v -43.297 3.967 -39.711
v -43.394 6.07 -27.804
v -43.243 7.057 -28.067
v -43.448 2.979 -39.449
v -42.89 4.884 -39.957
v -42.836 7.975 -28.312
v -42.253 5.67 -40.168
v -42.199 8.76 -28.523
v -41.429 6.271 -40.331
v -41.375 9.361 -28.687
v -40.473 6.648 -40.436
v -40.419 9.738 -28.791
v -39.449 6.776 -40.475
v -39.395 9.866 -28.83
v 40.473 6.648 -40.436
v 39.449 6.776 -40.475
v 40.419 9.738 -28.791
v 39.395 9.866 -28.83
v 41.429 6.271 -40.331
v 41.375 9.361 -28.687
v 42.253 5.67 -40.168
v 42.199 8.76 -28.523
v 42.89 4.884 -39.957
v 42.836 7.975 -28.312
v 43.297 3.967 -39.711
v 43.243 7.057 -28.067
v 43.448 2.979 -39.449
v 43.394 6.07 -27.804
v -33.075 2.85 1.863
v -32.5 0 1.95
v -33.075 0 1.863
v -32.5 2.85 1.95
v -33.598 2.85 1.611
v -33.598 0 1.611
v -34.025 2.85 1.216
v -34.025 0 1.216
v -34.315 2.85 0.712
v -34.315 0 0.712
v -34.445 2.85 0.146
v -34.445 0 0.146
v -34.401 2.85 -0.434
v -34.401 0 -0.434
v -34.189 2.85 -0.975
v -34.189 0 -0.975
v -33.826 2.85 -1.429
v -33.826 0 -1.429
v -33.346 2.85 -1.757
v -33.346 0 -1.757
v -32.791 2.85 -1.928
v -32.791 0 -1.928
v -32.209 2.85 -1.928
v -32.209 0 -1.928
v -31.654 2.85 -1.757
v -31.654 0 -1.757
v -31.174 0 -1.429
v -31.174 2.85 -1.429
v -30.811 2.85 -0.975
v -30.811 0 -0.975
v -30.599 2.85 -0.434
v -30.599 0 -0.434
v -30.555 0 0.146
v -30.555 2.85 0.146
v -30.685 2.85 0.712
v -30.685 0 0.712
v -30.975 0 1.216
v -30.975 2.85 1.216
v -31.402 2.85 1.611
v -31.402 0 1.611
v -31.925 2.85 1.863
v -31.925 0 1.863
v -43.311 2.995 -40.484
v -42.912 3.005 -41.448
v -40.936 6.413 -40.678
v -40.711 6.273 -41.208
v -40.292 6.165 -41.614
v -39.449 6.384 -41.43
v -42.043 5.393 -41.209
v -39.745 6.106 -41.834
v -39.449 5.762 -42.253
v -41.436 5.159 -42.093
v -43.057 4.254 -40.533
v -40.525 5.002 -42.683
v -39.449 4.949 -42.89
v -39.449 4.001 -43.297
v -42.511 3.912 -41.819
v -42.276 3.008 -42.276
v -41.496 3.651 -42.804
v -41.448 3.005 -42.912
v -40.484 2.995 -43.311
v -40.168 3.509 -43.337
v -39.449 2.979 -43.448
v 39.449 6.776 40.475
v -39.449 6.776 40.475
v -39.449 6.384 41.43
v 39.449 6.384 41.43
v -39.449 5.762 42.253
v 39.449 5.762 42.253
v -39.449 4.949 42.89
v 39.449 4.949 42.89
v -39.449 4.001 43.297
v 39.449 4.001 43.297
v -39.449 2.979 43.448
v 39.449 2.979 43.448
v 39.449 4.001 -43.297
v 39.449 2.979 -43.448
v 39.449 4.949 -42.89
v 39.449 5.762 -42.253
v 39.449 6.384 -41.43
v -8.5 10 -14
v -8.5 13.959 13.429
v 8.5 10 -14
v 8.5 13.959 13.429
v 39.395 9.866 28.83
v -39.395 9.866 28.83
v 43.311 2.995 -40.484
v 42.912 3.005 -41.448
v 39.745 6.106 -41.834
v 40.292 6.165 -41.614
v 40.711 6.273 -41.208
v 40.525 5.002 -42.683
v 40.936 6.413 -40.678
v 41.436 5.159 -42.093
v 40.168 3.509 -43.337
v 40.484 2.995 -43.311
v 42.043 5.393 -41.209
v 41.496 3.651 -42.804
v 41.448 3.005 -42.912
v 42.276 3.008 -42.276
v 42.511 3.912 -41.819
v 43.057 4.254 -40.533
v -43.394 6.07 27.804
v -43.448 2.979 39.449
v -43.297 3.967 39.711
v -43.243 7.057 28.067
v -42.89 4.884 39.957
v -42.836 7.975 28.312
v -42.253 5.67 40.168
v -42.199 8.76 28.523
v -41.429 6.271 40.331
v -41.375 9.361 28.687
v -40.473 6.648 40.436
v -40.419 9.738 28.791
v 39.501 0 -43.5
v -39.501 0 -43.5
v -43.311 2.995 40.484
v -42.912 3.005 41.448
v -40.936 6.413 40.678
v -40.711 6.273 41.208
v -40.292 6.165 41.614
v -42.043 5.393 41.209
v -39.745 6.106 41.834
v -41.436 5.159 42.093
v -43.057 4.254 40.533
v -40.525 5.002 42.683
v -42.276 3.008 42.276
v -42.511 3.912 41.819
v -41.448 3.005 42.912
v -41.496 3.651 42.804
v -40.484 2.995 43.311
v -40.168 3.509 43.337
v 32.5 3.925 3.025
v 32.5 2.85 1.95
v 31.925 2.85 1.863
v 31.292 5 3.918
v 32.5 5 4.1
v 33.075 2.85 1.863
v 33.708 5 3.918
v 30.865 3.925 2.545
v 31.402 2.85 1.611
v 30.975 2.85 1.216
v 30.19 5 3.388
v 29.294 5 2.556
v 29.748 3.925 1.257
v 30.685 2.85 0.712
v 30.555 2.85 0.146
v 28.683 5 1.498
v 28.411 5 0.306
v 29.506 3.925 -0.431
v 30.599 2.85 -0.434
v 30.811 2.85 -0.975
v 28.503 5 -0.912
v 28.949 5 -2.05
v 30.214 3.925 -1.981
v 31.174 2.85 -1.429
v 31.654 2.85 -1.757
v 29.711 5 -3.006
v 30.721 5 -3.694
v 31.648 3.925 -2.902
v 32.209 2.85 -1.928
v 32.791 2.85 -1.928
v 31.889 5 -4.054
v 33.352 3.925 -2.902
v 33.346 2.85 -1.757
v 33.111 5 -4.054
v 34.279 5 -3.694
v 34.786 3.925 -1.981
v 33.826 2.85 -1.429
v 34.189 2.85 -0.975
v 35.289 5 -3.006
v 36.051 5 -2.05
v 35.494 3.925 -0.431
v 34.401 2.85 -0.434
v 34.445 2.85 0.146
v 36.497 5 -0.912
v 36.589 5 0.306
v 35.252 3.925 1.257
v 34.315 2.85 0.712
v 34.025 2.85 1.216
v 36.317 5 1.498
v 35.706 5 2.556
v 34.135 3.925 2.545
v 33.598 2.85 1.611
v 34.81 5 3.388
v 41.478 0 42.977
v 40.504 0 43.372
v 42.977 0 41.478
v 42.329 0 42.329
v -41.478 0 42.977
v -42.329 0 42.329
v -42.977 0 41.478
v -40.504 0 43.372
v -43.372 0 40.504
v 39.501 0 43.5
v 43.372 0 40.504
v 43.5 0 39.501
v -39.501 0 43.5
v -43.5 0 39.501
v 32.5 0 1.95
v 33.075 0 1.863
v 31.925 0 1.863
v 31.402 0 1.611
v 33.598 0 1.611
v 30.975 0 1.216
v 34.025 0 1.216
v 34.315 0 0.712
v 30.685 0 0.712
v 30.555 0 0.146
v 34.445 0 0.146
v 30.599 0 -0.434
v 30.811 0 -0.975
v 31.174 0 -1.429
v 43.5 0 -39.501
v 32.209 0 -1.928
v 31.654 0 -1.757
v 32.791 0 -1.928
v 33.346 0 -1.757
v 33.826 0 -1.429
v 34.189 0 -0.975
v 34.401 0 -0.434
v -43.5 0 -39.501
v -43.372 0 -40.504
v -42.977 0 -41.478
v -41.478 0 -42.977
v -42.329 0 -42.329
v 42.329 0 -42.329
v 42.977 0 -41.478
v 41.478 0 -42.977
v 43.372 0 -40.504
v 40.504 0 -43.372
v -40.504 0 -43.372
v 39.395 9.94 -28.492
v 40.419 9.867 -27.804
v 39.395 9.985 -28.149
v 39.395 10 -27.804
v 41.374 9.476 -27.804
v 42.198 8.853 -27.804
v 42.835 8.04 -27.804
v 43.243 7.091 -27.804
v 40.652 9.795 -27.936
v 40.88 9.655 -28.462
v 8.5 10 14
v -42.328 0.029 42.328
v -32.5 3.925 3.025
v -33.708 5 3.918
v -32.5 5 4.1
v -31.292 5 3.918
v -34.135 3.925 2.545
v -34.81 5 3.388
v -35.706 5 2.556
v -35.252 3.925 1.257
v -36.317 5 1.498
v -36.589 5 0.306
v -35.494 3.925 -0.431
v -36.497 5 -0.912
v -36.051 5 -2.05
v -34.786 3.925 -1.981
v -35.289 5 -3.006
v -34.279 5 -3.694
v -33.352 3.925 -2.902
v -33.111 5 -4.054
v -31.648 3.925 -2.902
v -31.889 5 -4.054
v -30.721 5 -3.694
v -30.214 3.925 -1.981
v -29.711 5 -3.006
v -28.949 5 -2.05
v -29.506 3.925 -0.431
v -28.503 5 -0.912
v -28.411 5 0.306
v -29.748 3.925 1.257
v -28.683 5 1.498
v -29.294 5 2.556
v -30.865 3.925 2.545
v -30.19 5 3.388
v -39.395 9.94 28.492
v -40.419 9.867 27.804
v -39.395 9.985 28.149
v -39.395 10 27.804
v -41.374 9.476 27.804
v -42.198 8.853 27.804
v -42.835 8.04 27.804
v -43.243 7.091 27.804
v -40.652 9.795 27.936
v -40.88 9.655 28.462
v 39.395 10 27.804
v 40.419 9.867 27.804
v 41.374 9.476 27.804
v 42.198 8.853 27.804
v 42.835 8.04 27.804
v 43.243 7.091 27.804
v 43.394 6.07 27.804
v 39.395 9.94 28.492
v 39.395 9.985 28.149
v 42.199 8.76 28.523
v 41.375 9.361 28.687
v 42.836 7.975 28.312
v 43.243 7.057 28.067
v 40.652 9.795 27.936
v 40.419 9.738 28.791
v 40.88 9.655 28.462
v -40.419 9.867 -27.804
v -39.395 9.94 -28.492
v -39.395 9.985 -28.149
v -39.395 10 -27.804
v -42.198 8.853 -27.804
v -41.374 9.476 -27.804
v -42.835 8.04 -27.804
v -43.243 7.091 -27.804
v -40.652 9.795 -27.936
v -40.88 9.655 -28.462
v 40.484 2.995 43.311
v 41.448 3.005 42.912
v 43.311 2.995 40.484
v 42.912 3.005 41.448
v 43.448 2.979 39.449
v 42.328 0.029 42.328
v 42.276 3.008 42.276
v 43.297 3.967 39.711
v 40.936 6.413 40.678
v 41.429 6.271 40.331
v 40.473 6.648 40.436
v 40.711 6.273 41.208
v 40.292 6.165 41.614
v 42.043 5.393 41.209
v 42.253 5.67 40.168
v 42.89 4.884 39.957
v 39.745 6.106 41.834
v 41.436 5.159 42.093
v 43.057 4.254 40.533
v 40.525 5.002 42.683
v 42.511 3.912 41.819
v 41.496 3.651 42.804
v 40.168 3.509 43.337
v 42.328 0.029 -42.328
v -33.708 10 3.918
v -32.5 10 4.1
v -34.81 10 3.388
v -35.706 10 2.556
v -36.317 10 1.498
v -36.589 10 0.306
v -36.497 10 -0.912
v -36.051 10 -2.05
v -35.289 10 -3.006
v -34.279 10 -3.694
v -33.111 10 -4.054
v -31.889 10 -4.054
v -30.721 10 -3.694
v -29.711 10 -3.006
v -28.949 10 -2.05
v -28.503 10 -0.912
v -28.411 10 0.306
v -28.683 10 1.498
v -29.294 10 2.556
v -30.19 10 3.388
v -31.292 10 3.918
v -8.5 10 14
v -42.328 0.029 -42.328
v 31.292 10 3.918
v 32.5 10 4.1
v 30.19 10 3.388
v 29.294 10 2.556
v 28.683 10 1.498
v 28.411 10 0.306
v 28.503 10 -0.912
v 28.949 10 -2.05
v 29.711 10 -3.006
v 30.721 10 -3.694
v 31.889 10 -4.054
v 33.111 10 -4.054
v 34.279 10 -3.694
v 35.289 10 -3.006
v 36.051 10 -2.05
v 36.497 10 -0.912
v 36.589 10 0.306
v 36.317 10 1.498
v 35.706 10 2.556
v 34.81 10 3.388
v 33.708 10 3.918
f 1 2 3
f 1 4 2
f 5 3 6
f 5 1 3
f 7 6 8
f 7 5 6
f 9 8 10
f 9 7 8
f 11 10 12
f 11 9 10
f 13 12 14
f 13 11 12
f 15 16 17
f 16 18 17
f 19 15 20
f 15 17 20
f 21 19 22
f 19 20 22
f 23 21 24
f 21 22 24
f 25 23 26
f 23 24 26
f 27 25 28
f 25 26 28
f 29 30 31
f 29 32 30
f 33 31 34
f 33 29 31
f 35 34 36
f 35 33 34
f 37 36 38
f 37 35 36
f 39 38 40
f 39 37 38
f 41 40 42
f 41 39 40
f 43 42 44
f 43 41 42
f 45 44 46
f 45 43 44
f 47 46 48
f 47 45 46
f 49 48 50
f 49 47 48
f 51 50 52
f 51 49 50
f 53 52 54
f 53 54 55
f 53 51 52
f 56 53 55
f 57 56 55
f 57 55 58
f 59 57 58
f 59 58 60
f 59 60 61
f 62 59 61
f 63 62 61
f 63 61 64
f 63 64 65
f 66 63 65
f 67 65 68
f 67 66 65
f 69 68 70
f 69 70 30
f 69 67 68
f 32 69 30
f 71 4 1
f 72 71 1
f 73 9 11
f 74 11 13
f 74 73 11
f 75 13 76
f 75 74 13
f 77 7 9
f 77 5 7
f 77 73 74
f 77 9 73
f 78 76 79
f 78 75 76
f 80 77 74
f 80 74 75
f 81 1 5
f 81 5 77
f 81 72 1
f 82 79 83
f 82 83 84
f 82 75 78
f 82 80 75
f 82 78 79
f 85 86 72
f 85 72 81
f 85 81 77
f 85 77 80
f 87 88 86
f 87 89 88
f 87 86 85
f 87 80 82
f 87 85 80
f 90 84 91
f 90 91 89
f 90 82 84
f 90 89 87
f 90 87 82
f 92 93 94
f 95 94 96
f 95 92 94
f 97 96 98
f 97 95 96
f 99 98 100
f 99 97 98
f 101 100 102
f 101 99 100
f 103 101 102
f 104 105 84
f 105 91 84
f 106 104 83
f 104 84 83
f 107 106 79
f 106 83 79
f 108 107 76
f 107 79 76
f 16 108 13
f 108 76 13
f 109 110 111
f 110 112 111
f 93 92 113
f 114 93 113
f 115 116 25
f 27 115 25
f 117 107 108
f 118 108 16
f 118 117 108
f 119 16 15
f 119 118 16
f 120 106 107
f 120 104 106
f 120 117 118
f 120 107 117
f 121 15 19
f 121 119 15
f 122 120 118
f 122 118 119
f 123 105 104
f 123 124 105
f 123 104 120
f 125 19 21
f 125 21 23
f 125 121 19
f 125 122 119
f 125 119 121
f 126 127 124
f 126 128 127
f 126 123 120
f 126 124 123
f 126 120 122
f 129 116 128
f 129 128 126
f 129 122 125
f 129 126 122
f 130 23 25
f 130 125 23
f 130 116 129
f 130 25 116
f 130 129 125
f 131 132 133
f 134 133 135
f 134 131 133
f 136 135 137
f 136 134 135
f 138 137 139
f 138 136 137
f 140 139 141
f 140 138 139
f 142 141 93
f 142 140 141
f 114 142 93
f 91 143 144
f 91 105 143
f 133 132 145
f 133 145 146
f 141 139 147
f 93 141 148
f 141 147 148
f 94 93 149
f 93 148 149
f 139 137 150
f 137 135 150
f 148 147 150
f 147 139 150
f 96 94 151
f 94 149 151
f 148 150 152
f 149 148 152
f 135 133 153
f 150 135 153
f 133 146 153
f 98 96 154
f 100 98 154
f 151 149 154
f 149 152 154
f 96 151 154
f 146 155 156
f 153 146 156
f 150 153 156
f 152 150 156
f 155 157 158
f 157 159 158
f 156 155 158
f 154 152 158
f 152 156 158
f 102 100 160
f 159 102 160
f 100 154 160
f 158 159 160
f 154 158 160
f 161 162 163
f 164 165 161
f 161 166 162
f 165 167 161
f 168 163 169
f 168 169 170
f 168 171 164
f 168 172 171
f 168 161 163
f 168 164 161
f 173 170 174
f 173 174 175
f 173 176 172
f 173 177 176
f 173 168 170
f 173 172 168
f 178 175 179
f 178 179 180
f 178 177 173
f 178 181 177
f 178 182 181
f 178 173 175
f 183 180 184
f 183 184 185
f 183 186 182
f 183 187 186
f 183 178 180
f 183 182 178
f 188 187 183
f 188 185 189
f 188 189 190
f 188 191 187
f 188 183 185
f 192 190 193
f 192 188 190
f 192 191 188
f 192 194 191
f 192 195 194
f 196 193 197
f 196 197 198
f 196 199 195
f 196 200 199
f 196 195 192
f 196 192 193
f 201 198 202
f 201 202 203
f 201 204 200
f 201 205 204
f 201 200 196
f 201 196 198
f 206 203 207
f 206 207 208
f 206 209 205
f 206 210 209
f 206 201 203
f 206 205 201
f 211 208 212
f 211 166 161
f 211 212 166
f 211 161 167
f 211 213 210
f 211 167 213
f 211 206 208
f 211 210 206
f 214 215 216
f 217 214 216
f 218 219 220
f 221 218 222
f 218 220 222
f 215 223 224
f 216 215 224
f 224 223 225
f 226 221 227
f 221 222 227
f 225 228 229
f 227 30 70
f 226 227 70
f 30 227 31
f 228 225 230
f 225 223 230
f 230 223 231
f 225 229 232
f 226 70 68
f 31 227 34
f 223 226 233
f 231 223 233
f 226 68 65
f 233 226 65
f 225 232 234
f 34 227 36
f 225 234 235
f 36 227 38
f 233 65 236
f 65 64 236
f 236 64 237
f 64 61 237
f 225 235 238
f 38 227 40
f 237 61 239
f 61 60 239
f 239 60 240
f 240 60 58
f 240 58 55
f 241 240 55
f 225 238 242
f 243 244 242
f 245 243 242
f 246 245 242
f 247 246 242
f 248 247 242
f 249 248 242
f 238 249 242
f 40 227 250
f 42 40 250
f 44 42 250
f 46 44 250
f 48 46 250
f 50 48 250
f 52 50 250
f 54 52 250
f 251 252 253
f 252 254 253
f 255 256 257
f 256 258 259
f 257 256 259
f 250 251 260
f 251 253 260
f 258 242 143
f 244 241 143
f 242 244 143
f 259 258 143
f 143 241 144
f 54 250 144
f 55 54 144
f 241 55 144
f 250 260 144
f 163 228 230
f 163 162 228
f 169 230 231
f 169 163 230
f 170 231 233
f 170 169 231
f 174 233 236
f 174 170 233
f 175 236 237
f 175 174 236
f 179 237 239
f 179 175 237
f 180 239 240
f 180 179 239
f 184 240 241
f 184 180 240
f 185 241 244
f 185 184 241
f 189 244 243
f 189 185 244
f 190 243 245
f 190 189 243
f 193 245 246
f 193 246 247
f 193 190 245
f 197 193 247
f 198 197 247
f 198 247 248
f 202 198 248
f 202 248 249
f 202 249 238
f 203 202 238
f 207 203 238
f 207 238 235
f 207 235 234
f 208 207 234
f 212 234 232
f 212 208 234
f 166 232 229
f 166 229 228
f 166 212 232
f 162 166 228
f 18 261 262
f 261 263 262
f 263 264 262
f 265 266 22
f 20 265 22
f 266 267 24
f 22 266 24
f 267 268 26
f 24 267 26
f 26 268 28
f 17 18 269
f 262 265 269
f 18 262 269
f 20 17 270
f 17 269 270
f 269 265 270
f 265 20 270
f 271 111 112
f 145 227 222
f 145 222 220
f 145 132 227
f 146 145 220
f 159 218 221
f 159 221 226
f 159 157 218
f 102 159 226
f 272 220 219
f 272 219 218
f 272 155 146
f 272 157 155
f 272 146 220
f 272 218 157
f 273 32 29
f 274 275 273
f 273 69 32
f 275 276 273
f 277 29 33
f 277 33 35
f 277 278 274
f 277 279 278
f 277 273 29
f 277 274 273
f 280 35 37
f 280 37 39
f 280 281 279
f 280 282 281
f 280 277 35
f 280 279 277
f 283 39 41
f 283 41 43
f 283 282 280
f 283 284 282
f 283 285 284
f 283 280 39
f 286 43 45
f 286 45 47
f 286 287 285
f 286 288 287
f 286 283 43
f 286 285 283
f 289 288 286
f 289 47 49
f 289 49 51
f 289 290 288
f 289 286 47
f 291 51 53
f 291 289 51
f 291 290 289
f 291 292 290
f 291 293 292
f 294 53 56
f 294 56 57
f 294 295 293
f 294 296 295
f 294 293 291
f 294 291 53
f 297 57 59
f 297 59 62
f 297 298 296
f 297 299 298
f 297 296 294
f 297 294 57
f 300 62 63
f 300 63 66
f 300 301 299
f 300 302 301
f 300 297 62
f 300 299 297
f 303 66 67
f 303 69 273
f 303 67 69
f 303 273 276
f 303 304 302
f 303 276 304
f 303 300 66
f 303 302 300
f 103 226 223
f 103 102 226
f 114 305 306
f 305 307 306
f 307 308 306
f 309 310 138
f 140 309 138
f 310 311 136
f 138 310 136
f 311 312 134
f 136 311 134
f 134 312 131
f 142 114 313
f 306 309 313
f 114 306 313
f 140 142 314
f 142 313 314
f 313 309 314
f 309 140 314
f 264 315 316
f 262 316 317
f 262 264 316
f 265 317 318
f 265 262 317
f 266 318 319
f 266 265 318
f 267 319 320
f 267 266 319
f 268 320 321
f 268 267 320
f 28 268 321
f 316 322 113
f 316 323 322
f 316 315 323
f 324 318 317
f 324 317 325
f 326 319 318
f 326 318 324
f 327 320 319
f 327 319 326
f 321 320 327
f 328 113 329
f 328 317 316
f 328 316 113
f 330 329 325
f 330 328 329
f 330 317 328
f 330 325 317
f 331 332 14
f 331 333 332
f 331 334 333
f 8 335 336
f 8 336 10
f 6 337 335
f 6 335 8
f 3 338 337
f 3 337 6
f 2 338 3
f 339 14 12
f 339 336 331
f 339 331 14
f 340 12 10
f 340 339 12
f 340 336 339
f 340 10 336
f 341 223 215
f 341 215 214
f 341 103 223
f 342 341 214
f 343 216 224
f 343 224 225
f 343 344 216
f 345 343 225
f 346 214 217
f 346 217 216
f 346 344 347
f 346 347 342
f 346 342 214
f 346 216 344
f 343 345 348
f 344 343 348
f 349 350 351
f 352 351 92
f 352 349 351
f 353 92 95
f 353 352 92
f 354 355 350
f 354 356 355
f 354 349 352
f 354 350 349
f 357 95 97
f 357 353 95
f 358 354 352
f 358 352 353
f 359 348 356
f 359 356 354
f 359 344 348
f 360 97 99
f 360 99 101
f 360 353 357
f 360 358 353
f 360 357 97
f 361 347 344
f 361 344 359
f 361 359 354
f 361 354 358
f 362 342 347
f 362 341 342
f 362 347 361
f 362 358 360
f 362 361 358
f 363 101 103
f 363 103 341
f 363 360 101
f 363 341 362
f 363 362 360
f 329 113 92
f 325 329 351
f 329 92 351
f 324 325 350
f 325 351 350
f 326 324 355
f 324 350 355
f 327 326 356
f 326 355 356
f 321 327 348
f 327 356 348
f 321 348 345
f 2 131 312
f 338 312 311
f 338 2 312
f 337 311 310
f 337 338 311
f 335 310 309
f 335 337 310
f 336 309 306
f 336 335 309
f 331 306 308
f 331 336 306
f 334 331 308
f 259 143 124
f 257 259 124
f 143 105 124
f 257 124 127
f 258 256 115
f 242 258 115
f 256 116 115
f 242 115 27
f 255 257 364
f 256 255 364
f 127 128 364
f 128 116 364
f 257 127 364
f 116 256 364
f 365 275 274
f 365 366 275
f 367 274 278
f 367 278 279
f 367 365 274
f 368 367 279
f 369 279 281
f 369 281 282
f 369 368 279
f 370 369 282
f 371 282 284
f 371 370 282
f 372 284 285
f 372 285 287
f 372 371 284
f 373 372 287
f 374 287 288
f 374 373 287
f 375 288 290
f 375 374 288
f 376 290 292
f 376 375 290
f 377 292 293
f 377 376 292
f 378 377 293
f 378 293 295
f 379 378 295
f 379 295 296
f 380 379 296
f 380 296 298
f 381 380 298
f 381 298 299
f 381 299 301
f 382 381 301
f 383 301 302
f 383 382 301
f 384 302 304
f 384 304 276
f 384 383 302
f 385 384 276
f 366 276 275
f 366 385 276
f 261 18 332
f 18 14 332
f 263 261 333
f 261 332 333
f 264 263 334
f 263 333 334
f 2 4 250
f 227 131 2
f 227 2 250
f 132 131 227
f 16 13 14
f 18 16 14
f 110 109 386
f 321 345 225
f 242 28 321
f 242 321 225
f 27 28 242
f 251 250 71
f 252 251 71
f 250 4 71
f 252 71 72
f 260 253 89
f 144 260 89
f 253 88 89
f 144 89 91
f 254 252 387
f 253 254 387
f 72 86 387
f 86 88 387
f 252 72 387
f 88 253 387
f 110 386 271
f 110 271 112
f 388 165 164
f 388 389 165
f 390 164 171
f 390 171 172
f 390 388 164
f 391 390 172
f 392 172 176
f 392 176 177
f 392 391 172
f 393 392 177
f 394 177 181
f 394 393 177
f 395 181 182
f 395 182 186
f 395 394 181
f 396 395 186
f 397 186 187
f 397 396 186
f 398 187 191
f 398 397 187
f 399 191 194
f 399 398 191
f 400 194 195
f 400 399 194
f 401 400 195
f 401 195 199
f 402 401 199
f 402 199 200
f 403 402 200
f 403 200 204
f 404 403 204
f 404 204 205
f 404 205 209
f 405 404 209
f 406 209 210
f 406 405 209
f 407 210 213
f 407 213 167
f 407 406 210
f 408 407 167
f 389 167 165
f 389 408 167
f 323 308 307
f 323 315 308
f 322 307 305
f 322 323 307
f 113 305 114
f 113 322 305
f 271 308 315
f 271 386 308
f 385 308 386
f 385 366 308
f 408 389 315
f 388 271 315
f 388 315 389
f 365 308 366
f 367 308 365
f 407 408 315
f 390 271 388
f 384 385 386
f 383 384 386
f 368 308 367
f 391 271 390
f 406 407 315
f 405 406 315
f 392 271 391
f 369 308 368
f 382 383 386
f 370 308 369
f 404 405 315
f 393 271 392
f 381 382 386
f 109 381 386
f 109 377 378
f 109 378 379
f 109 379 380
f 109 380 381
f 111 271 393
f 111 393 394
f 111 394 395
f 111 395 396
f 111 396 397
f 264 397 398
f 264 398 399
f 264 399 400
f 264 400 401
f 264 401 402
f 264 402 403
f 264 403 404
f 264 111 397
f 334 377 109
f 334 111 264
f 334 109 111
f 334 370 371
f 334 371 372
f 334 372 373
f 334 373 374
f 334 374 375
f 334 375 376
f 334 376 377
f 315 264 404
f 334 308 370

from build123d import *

# Parameters (mm, degrees)
SKETCH1_W                                      = 87
SKETCH1_H                                      = 87
BOSS_EXTRUDE1_DEPTH                            = 10
BOSS_EXTRUDE1_TAPER                            = 1
CHAMFER1_SIZE                                  = 4
CHAMFER1_SIZE_2                                = 15
BOSS_EXTRUDE2_DEPTH                            = 8.5
FILLET1_R                                      = 4
CSK_FOR_M3_5_FLAT_HEAD_MACHINE_SCREW1_AT_COUNT = 2
CSK_FOR_M3_5_FLAT_HEAD_MACHINE_SCREW1_AT_PITCH = 65


with BuildPart() as part:
    # Sketch1 → Boss-Extrude1 (new body)
    with BuildSketch(Plane(origin=(0, 0, 0), x_dir=(1, 0, 0), z_dir=(0, 1, 0))):
        Rectangle(SKETCH1_W, SKETCH1_H)
    extrude(amount=BOSS_EXTRUDE1_DEPTH, taper=BOSS_EXTRUDE1_TAPER)

    # Chamfer1
    # the kernel refuses this chamfer: 15, 4 mm, written as the material it takes off along each edge
    with BuildSketch(Plane(origin=(-82.277161627, 10, 43.325449351), x_dir=(0, -0.9879836574445086, 0.1545583793347103), z_dir=(1, 0, 0)), Plane(origin=(82.277161627, 10, -43.325449351), x_dir=(0, -0.9879836574445086, -0.1545583793347103), z_dir=(-1, 0, 0))) as chamfer1_piece_1:
        Polygon((CHAMFER1_SIZE * 0.990530598403, CHAMFER1_SIZE * 0.137292147002), (-CHAMFER1_SIZE_2 * 0.154558379335, CHAMFER1_SIZE_2 * 0.987983657445), (0, 0), align=None)
    extrude(amount=164.554323254, mode=Mode.SUBTRACT)

    # Sketch2 → Boss-Extrude2 (add, symmetric)
    with BuildSketch(Plane(origin=(0, 0, 0), x_dir=(0, 0, -1), z_dir=(1, 0, 0))):
        Polygon((-14, 10), (-13.428571429, 13.958973274), (14, 10), align=None)
    extrude(amount=BOSS_EXTRUDE2_DEPTH, both=True)

    # Fillet1
    fillet1_edges = [part.edges().sort_by_distance(p)[0] for p in [
        (43.325449351, 10, 0),
        (-43.325449351, 10, 0),
        (0, 10, 28.325449351),
        (0, 10, -28.325449351),
        (-43.447629488, 3.00030461, 43.447629488),
        (-43.447629488, 3.00030461, -43.447629488),
        (-43.360354164, 8.00030461, 35.860354164),
        (-43.360354164, 8.00030461, -35.860354164),
        (43.447629488, 3.00030461, -43.447629488),
        (0, 6.000609219, -43.395258976),
        (43.447629488, 3.00030461, 43.447629488),
        (43.360354164, 8.00030461, 35.860354164),
        (43.360354164, 8.00030461, -35.860354164),
        (0, 6.000609219, 43.395258976),
    ]]
    fillet(fillet1_edges, radius=FILLET1_R)

    # Sketch3 → CSK for M3.5 Flat Head Machine Screw1 (revolve, cut)
    with BuildSketch(Plane(origin=(-32.5, 10, 0), x_dir=(0, 0, 1), z_dir=(1, 0, 0))):
        Polygon((0, 0), (0, 10), (1.95, 10), (1.95, 7.15), (4.1, 5), (4.1, 0), align=None)
    csk_for_m3_5_flat_head_machine_screw1 = revolve(axis=Axis((-32.5, 16.35, 0), (0, -1, 0)), mode=Mode.SUBTRACT)

    # CSK for M3.5 Flat Head Machine Screw1 at: CSK for M3.5 Flat Head Machine Screw1 ×2
    with Locations(*[(i * CSK_FOR_M3_5_FLAT_HEAD_MACHINE_SCREW1_AT_PITCH, 0, 0) for i in range(1, CSK_FOR_M3_5_FLAT_HEAD_MACHINE_SCREW1_AT_COUNT)]):
        add(csk_for_m3_5_flat_head_machine_screw1, mode=Mode.SUBTRACT)


solid = part.part
